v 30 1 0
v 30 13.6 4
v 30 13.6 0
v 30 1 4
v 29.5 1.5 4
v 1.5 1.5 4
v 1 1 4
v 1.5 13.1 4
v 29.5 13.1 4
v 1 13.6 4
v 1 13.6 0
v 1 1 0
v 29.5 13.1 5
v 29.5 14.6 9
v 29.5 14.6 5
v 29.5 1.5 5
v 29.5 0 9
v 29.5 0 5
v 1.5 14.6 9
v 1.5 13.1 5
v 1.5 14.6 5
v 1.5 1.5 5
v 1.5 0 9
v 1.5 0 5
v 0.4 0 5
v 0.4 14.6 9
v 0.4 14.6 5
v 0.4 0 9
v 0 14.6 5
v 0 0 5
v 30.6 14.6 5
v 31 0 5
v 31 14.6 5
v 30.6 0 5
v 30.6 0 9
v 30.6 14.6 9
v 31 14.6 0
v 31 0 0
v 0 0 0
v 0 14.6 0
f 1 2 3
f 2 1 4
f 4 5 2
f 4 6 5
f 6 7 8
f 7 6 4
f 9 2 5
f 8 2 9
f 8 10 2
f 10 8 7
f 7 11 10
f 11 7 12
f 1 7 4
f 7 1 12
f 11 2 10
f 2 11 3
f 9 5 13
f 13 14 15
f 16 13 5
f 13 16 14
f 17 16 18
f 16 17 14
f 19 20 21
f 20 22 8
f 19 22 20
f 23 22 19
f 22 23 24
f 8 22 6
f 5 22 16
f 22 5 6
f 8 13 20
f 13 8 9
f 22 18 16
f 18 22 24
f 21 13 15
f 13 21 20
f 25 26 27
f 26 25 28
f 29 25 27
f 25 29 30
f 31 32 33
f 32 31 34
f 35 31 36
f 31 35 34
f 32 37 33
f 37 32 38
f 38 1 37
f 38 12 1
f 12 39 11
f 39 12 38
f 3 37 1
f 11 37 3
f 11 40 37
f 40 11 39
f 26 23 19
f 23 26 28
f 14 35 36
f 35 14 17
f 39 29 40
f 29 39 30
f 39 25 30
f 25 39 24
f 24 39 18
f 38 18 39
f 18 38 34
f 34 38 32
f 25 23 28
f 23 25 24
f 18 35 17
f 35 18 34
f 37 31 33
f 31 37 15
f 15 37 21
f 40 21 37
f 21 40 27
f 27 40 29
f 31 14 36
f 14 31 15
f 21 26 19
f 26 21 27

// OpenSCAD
// Halterung für größeres RX/TX Umschaltrelais für uBit-V6

// Resolution for 3D printing:
$fa = 1;
$fs = 0.4;

// Allgemeines:
delta                  =   0.1; // Standard Durchdringung

relais_laenge          =  29.0;
relais_breite          =  12.6;
relais_grund           =   4.0;

luft                   =   5.0; // Wo die Verdrahtung ist

wand_dicke             =   1.0;
einrueckung            =   0.5;

module verjuengung() {
        cube([einrueckung, 
              relais_breite + 2*wand_dicke + 2*delta,
              luft - wand_dicke + delta]);
}

module innen() {
    // Oberer Rahmen
    translate([wand_dicke, wand_dicke, luft])
        cube([relais_laenge,
              relais_breite,
              relais_grund + delta]);
    // Unten Verdrahtungsbereich
    translate([wand_dicke + einrueckung,
               wand_dicke + einrueckung,
               -delta])
        cube([relais_laenge - 2*einrueckung,
              relais_breite - 2*einrueckung,
              luft + 2*delta]);
    // Seitliche Öffnung
    translate([wand_dicke + einrueckung,
               -delta, -delta])
        cube([relais_laenge - 2*einrueckung,
              relais_breite + 2*wand_dicke + 2*delta,
              luft - wand_dicke + delta]);
    // Verjuengung links
    translate([-delta, -delta, -delta])
        verjuengung();
    // Verjuengung rechts
    translate([relais_laenge + 2*wand_dicke - einrueckung
               + delta,-delta, -delta])
            verjuengung();
};

module bauteil() {
    difference() {
        cube([relais_laenge + 2*wand_dicke,
              relais_breite + 2*wand_dicke,
              relais_grund + luft]);
        innen();
    };
};

translate([0,
           relais_breite + 2*wand_dicke,
           luft + relais_grund])
    rotate([180, 0, 0])
        bauteil();
